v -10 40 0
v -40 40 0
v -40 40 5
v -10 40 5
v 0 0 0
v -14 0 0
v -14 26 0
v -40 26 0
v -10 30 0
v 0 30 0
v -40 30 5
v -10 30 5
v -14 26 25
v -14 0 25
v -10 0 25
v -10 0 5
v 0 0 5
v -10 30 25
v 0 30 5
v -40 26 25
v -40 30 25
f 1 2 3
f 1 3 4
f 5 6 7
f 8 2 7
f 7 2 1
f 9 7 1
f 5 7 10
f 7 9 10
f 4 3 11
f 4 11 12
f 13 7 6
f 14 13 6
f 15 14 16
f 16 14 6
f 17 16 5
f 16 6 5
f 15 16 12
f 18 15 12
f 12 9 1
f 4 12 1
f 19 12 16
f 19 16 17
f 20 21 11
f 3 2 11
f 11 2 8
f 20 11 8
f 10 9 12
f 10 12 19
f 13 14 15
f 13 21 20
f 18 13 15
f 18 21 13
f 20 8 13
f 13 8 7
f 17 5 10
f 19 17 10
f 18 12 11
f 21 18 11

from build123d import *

# Parameters (mm, degrees)
F0_W     = 30
F0_H     = 10
F1_DEPTH = 5
F0_W_2   = 10
F0_H_2   = 30
F2_DEPTH = 25


with BuildPart() as f1:
    # F0 (on Top) → F1 (new body)
    with BuildSketch(Plane.XY):
        with Locations((-25, 35)):
            Rectangle(F0_W, F0_H)
    extrude(amount=F1_DEPTH)



with BuildPart() as f1b:
    # F0 (on Top) → F1, piece 2 (new body)
    with BuildSketch(Plane.XY):
        with Locations((-5, 15)):
            Rectangle(F0_W_2, F0_H_2)
    extrude(amount=F1_DEPTH)


with BuildPart() as f1_1:
    add(f1.part)

    add(f1b.part)  # F2 merges F1b
    # F0 (on Top) → F2 (join)
    with BuildSketch(Plane.XY):
        Polygon((-14, 0), (-10, 0), (-10, 30), (-40, 30), (-40, 26), (-14, 26), align=None)
    extrude(amount=F2_DEPTH)


solid = f1_1.part
